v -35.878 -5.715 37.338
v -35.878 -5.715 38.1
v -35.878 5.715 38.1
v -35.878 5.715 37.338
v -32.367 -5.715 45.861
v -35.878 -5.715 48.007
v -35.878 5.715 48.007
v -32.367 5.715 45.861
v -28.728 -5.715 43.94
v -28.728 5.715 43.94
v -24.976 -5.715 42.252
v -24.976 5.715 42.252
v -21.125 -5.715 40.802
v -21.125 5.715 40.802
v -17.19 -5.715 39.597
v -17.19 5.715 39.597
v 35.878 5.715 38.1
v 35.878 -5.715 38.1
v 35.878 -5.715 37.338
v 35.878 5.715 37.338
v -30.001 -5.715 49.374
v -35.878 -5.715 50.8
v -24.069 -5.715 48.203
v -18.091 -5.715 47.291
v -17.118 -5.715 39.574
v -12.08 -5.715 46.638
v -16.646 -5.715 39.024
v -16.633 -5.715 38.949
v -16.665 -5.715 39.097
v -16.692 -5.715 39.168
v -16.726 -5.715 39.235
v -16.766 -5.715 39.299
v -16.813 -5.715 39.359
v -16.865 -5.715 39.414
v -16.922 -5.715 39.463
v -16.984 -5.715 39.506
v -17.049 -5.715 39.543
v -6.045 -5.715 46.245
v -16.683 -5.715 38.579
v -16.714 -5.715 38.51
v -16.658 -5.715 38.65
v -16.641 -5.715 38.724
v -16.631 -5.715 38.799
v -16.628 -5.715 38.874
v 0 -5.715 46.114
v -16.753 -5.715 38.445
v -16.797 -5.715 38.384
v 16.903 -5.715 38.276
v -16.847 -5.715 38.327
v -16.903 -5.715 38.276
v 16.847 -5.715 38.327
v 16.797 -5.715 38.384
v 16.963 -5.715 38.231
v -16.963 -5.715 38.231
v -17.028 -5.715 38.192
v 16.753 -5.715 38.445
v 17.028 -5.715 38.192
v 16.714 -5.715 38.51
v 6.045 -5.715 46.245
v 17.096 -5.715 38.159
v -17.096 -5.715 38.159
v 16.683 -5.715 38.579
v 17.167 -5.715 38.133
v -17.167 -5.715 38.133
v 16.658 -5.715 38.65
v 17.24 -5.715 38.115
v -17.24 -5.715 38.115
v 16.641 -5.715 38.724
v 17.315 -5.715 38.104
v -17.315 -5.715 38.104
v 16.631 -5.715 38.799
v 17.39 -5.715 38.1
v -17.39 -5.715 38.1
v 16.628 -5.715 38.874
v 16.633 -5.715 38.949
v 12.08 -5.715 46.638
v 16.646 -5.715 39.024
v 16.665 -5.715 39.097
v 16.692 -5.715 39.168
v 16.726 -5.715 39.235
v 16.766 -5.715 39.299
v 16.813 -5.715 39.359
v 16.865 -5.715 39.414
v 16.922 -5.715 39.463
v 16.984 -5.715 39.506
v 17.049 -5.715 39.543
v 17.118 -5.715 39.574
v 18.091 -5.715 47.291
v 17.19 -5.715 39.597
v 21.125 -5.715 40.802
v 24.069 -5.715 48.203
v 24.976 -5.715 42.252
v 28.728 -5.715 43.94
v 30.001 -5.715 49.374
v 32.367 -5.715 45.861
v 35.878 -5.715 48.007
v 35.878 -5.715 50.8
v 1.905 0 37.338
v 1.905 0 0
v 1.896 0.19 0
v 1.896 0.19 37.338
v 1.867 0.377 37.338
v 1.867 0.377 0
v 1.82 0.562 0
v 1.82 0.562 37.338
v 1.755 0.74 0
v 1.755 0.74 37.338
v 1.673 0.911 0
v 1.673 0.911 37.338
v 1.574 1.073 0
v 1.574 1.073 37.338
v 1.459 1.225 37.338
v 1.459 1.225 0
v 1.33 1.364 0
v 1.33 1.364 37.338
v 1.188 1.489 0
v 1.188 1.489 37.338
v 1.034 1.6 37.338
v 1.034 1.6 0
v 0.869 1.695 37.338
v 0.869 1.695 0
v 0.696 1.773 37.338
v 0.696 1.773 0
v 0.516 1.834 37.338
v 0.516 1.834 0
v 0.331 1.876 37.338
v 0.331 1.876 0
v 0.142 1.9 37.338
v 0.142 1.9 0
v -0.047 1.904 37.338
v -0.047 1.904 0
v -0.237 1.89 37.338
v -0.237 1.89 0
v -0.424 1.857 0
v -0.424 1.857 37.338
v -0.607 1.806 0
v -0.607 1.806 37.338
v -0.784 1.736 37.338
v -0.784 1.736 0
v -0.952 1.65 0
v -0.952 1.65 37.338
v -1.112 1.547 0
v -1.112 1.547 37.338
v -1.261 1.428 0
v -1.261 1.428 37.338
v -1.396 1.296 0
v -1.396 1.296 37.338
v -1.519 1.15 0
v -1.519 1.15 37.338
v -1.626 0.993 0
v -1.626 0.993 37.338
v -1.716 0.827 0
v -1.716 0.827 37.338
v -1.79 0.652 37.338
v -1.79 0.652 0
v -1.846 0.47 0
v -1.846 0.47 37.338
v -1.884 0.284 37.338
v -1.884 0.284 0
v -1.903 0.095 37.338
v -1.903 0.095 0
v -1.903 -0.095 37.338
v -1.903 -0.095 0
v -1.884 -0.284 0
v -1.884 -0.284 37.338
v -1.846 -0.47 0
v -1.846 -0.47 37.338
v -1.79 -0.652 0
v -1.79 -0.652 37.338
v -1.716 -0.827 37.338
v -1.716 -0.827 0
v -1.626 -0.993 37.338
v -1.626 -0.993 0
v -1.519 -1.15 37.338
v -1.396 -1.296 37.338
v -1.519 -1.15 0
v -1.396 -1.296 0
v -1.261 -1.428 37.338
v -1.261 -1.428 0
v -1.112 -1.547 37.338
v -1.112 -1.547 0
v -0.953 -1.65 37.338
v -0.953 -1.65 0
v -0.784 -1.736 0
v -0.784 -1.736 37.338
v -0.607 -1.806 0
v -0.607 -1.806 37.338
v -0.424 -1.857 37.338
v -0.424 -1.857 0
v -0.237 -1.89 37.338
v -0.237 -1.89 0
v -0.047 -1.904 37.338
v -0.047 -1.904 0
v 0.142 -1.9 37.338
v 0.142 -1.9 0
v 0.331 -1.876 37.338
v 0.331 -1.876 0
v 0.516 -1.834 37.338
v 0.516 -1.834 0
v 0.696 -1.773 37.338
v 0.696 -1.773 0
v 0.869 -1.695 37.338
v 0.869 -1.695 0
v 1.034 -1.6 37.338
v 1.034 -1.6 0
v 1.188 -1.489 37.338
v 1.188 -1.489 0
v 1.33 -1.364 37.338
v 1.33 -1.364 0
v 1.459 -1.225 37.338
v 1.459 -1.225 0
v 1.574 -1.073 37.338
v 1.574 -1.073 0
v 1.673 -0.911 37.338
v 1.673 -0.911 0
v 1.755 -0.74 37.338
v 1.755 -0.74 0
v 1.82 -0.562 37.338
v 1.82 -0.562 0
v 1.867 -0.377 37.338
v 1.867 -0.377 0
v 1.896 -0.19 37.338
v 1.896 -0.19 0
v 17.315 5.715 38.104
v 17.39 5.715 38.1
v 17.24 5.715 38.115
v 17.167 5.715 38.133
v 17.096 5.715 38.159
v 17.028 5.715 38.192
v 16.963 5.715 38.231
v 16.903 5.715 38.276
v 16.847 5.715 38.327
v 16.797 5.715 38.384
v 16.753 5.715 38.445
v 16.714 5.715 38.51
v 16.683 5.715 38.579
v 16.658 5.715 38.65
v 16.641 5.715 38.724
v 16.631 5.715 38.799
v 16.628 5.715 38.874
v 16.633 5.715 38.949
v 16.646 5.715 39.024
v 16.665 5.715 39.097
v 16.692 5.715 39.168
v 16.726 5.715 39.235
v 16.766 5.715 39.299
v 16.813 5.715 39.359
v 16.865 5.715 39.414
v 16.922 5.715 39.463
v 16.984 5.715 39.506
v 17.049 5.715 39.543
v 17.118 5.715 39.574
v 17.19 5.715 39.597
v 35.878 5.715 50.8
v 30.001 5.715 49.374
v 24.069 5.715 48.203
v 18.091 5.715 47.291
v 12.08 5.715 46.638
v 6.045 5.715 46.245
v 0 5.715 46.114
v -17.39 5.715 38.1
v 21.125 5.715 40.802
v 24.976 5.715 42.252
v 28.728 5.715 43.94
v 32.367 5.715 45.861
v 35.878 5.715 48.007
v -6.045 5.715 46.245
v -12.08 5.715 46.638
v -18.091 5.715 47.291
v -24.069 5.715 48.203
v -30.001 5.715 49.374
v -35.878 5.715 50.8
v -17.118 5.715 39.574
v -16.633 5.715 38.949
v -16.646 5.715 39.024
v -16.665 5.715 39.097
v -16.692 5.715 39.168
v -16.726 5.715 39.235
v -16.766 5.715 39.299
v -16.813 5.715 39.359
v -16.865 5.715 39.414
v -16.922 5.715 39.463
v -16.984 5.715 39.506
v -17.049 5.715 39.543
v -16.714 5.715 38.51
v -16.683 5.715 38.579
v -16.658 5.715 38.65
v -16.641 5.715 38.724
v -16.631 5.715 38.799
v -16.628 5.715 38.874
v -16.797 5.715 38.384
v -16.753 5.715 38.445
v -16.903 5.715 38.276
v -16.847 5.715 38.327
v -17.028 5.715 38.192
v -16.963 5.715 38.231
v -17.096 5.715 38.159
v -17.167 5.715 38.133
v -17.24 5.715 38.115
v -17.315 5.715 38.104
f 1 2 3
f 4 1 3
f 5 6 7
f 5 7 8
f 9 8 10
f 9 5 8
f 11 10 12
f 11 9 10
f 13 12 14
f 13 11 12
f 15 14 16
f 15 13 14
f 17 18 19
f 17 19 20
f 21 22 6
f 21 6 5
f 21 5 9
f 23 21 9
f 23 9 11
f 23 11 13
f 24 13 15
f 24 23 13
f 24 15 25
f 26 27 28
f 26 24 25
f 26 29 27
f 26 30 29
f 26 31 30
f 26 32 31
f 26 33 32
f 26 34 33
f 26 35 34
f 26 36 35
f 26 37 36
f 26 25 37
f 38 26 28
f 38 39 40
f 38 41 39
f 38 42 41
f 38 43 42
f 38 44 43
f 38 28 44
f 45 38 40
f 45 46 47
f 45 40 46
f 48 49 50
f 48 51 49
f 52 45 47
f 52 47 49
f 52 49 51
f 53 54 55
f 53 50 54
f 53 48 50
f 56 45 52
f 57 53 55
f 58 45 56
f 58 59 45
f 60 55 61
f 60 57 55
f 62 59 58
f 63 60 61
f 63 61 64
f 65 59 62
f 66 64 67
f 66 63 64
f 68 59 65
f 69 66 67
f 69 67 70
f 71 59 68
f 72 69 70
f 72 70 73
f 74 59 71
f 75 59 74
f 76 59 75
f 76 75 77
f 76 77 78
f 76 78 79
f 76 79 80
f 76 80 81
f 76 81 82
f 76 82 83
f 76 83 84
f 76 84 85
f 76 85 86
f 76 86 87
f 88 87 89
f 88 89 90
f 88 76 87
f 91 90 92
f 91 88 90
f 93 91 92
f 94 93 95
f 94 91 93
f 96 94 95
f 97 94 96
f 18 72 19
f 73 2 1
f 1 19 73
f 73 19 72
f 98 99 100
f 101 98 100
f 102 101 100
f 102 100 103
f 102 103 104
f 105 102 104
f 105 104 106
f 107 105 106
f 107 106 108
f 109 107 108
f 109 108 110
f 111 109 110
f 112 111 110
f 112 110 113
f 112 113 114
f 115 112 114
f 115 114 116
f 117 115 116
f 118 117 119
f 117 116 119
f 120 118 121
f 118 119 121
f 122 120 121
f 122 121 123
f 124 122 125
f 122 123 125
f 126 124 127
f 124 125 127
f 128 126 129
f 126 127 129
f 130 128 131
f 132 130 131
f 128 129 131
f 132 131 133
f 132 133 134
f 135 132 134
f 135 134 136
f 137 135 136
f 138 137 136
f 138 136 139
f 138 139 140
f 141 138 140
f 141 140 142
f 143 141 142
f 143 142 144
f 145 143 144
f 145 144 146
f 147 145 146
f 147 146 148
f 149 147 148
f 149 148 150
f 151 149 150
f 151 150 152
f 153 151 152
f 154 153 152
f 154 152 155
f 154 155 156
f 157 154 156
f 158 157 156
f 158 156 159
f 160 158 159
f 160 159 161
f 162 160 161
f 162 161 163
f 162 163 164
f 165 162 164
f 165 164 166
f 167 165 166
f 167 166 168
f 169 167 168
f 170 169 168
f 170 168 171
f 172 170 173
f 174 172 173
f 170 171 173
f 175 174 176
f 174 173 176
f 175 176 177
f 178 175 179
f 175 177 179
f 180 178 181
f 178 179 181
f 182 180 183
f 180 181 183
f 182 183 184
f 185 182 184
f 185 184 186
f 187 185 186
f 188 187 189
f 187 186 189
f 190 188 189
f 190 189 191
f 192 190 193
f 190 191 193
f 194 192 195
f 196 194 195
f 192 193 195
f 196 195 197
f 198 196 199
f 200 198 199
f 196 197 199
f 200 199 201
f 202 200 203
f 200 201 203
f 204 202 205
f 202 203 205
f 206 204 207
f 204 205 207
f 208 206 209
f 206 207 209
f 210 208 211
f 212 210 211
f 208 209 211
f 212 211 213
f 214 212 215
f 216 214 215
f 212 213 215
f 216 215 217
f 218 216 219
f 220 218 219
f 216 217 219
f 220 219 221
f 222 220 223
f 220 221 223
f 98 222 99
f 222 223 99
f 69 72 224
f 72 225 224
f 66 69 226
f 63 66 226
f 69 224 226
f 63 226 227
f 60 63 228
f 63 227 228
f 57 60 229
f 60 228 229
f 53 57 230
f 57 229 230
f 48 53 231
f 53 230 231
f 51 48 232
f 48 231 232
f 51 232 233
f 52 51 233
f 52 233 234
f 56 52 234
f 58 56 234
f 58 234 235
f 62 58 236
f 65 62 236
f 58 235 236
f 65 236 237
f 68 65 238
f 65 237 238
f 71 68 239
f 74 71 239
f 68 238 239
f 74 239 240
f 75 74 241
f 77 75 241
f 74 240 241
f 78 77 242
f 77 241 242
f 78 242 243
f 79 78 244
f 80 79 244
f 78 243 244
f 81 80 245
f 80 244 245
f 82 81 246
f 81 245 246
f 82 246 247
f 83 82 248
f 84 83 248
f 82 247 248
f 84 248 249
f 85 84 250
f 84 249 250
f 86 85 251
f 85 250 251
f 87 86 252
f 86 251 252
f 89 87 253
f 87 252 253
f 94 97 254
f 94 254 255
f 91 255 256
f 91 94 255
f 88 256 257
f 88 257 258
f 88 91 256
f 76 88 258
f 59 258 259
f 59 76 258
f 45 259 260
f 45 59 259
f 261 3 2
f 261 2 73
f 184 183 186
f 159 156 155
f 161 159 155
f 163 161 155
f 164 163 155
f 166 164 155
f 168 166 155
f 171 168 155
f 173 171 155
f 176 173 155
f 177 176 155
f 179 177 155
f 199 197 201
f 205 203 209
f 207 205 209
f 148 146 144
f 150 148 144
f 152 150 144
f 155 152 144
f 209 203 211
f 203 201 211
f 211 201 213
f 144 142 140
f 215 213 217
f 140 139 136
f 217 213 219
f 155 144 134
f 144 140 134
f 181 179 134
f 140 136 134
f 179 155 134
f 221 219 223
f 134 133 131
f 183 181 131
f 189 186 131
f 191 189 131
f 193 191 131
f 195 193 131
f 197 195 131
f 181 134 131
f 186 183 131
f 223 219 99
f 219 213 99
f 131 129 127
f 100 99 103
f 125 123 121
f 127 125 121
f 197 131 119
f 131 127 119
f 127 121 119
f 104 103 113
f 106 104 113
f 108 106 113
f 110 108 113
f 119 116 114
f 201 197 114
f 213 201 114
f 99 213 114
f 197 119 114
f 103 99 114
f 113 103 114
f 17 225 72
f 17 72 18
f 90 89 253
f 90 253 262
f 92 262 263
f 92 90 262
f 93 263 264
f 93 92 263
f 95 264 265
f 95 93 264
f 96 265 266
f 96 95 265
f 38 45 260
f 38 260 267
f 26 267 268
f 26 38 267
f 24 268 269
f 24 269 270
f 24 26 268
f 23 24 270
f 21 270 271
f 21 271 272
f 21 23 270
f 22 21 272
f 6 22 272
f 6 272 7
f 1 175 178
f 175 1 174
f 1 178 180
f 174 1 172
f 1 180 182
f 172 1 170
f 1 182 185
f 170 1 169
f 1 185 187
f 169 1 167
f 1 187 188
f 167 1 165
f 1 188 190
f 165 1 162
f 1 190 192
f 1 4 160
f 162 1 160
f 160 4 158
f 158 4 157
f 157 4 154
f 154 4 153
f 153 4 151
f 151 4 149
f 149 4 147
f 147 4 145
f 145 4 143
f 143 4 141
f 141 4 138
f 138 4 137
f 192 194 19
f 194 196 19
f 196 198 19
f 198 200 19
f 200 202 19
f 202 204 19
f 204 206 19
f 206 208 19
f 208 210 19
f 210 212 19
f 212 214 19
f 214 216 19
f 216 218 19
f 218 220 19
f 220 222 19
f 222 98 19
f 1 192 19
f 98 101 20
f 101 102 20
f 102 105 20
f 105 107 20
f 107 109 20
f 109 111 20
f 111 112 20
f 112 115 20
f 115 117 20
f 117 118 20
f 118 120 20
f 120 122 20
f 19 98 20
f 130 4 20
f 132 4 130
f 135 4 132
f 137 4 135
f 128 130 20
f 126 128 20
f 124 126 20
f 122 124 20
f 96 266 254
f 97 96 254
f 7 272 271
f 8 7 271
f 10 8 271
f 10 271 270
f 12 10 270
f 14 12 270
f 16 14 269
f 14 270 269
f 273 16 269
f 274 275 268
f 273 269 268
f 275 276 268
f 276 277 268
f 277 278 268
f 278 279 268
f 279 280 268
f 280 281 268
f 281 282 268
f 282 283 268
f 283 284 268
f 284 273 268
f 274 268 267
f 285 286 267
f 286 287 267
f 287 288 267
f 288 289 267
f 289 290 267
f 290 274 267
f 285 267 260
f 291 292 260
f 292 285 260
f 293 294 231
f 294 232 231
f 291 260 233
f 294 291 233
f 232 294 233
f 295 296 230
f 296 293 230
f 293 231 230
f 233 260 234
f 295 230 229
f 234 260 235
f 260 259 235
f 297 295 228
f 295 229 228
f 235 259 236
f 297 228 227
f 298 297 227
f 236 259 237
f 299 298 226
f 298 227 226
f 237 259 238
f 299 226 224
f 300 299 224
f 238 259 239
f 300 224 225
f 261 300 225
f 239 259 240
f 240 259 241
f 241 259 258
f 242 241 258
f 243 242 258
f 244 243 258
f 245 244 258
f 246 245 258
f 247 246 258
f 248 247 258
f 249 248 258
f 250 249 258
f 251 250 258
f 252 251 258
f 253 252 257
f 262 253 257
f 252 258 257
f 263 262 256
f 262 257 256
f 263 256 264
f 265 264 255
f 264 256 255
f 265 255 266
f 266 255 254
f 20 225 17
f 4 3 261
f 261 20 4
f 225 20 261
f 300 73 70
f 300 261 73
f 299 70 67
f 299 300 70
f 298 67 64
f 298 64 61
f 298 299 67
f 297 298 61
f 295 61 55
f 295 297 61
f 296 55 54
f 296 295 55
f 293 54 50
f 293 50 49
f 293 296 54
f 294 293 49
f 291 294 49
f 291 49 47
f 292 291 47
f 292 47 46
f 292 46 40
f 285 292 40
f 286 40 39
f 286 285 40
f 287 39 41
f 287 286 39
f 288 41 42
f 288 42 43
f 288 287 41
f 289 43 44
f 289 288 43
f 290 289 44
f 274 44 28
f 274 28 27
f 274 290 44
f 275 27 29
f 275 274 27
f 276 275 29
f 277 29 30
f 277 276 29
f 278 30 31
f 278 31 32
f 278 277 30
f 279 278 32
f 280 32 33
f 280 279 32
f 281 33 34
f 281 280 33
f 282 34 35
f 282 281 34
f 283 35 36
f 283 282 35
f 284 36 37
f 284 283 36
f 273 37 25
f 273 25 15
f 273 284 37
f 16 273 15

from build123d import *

# Parameters (mm, degrees)
F0_R     = 1.905
F1_DEPTH = 38.1
F2_W     = 71.755
F2_H     = 11.43
F2_R     = 1.905
F3_DEPTH = 0.762
F5_DEPTH = 11.43
F6_R     = 0.762


# Not quite as in the source:
# - a feature names something its author has since deleted; it is built from what else it names


with BuildPart() as f1:
    # F0 (on Top) → F1 (new body)
    with BuildSketch(Plane.XY):
        Circle(F0_R)
    extrude(amount=F1_DEPTH)

    # F2 (on face) → F3 (join)
    with BuildSketch(Plane.XY.offset(38.1)):
        Rectangle(F2_W, F2_H)
        Circle(F2_R, mode=Mode.SUBTRACT)
    extrude(amount=-F3_DEPTH)

    # F4 (on face) → F5 (join, through all)
    with BuildSketch(Plane.XZ.offset(5.715)):
        with BuildLine():
            ThreePointArc((0, 46.1144251321), (-18.0910863279, 47.2907715726), (-35.8775, 50.8))
            Line((-35.8775, 50.8), (-35.8775, 48.0069763479))
            ThreePointArc((-35.8775, 48.0069763479), (-23.5669827894, 41.6891623658), (-10.2035430744, 38.1))
            Line((-10.2035430744, 38.1), (0, 38.1))
            Line((0, 38.1), (0, 46.1144251321))
        make_face()
        with BuildLine():
            ThreePointArc((35.8775, 50.8), (18.0910863279, 47.2907715726), (0, 46.1144251321))
            Line((0, 46.1144251321), (0, 38.1))
            Line((0, 38.1), (10.2035430744, 38.1))
            ThreePointArc((10.2035430744, 38.1), (23.5669827894, 41.6891623658), (35.8775, 48.0069763479))
            Line((35.8775, 48.0069763479), (35.8775, 50.8))
        make_face()
    extrude(amount=-F5_DEPTH)

    # F6
    f6_edges = [f1.edges().sort_by_distance(p)[0] for p in [
        (10.203543, 0, 38.1),
        (-10.203543, 0, 38.1),
    ]]
    fillet(f6_edges, radius=F6_R)


solid = f1.part
